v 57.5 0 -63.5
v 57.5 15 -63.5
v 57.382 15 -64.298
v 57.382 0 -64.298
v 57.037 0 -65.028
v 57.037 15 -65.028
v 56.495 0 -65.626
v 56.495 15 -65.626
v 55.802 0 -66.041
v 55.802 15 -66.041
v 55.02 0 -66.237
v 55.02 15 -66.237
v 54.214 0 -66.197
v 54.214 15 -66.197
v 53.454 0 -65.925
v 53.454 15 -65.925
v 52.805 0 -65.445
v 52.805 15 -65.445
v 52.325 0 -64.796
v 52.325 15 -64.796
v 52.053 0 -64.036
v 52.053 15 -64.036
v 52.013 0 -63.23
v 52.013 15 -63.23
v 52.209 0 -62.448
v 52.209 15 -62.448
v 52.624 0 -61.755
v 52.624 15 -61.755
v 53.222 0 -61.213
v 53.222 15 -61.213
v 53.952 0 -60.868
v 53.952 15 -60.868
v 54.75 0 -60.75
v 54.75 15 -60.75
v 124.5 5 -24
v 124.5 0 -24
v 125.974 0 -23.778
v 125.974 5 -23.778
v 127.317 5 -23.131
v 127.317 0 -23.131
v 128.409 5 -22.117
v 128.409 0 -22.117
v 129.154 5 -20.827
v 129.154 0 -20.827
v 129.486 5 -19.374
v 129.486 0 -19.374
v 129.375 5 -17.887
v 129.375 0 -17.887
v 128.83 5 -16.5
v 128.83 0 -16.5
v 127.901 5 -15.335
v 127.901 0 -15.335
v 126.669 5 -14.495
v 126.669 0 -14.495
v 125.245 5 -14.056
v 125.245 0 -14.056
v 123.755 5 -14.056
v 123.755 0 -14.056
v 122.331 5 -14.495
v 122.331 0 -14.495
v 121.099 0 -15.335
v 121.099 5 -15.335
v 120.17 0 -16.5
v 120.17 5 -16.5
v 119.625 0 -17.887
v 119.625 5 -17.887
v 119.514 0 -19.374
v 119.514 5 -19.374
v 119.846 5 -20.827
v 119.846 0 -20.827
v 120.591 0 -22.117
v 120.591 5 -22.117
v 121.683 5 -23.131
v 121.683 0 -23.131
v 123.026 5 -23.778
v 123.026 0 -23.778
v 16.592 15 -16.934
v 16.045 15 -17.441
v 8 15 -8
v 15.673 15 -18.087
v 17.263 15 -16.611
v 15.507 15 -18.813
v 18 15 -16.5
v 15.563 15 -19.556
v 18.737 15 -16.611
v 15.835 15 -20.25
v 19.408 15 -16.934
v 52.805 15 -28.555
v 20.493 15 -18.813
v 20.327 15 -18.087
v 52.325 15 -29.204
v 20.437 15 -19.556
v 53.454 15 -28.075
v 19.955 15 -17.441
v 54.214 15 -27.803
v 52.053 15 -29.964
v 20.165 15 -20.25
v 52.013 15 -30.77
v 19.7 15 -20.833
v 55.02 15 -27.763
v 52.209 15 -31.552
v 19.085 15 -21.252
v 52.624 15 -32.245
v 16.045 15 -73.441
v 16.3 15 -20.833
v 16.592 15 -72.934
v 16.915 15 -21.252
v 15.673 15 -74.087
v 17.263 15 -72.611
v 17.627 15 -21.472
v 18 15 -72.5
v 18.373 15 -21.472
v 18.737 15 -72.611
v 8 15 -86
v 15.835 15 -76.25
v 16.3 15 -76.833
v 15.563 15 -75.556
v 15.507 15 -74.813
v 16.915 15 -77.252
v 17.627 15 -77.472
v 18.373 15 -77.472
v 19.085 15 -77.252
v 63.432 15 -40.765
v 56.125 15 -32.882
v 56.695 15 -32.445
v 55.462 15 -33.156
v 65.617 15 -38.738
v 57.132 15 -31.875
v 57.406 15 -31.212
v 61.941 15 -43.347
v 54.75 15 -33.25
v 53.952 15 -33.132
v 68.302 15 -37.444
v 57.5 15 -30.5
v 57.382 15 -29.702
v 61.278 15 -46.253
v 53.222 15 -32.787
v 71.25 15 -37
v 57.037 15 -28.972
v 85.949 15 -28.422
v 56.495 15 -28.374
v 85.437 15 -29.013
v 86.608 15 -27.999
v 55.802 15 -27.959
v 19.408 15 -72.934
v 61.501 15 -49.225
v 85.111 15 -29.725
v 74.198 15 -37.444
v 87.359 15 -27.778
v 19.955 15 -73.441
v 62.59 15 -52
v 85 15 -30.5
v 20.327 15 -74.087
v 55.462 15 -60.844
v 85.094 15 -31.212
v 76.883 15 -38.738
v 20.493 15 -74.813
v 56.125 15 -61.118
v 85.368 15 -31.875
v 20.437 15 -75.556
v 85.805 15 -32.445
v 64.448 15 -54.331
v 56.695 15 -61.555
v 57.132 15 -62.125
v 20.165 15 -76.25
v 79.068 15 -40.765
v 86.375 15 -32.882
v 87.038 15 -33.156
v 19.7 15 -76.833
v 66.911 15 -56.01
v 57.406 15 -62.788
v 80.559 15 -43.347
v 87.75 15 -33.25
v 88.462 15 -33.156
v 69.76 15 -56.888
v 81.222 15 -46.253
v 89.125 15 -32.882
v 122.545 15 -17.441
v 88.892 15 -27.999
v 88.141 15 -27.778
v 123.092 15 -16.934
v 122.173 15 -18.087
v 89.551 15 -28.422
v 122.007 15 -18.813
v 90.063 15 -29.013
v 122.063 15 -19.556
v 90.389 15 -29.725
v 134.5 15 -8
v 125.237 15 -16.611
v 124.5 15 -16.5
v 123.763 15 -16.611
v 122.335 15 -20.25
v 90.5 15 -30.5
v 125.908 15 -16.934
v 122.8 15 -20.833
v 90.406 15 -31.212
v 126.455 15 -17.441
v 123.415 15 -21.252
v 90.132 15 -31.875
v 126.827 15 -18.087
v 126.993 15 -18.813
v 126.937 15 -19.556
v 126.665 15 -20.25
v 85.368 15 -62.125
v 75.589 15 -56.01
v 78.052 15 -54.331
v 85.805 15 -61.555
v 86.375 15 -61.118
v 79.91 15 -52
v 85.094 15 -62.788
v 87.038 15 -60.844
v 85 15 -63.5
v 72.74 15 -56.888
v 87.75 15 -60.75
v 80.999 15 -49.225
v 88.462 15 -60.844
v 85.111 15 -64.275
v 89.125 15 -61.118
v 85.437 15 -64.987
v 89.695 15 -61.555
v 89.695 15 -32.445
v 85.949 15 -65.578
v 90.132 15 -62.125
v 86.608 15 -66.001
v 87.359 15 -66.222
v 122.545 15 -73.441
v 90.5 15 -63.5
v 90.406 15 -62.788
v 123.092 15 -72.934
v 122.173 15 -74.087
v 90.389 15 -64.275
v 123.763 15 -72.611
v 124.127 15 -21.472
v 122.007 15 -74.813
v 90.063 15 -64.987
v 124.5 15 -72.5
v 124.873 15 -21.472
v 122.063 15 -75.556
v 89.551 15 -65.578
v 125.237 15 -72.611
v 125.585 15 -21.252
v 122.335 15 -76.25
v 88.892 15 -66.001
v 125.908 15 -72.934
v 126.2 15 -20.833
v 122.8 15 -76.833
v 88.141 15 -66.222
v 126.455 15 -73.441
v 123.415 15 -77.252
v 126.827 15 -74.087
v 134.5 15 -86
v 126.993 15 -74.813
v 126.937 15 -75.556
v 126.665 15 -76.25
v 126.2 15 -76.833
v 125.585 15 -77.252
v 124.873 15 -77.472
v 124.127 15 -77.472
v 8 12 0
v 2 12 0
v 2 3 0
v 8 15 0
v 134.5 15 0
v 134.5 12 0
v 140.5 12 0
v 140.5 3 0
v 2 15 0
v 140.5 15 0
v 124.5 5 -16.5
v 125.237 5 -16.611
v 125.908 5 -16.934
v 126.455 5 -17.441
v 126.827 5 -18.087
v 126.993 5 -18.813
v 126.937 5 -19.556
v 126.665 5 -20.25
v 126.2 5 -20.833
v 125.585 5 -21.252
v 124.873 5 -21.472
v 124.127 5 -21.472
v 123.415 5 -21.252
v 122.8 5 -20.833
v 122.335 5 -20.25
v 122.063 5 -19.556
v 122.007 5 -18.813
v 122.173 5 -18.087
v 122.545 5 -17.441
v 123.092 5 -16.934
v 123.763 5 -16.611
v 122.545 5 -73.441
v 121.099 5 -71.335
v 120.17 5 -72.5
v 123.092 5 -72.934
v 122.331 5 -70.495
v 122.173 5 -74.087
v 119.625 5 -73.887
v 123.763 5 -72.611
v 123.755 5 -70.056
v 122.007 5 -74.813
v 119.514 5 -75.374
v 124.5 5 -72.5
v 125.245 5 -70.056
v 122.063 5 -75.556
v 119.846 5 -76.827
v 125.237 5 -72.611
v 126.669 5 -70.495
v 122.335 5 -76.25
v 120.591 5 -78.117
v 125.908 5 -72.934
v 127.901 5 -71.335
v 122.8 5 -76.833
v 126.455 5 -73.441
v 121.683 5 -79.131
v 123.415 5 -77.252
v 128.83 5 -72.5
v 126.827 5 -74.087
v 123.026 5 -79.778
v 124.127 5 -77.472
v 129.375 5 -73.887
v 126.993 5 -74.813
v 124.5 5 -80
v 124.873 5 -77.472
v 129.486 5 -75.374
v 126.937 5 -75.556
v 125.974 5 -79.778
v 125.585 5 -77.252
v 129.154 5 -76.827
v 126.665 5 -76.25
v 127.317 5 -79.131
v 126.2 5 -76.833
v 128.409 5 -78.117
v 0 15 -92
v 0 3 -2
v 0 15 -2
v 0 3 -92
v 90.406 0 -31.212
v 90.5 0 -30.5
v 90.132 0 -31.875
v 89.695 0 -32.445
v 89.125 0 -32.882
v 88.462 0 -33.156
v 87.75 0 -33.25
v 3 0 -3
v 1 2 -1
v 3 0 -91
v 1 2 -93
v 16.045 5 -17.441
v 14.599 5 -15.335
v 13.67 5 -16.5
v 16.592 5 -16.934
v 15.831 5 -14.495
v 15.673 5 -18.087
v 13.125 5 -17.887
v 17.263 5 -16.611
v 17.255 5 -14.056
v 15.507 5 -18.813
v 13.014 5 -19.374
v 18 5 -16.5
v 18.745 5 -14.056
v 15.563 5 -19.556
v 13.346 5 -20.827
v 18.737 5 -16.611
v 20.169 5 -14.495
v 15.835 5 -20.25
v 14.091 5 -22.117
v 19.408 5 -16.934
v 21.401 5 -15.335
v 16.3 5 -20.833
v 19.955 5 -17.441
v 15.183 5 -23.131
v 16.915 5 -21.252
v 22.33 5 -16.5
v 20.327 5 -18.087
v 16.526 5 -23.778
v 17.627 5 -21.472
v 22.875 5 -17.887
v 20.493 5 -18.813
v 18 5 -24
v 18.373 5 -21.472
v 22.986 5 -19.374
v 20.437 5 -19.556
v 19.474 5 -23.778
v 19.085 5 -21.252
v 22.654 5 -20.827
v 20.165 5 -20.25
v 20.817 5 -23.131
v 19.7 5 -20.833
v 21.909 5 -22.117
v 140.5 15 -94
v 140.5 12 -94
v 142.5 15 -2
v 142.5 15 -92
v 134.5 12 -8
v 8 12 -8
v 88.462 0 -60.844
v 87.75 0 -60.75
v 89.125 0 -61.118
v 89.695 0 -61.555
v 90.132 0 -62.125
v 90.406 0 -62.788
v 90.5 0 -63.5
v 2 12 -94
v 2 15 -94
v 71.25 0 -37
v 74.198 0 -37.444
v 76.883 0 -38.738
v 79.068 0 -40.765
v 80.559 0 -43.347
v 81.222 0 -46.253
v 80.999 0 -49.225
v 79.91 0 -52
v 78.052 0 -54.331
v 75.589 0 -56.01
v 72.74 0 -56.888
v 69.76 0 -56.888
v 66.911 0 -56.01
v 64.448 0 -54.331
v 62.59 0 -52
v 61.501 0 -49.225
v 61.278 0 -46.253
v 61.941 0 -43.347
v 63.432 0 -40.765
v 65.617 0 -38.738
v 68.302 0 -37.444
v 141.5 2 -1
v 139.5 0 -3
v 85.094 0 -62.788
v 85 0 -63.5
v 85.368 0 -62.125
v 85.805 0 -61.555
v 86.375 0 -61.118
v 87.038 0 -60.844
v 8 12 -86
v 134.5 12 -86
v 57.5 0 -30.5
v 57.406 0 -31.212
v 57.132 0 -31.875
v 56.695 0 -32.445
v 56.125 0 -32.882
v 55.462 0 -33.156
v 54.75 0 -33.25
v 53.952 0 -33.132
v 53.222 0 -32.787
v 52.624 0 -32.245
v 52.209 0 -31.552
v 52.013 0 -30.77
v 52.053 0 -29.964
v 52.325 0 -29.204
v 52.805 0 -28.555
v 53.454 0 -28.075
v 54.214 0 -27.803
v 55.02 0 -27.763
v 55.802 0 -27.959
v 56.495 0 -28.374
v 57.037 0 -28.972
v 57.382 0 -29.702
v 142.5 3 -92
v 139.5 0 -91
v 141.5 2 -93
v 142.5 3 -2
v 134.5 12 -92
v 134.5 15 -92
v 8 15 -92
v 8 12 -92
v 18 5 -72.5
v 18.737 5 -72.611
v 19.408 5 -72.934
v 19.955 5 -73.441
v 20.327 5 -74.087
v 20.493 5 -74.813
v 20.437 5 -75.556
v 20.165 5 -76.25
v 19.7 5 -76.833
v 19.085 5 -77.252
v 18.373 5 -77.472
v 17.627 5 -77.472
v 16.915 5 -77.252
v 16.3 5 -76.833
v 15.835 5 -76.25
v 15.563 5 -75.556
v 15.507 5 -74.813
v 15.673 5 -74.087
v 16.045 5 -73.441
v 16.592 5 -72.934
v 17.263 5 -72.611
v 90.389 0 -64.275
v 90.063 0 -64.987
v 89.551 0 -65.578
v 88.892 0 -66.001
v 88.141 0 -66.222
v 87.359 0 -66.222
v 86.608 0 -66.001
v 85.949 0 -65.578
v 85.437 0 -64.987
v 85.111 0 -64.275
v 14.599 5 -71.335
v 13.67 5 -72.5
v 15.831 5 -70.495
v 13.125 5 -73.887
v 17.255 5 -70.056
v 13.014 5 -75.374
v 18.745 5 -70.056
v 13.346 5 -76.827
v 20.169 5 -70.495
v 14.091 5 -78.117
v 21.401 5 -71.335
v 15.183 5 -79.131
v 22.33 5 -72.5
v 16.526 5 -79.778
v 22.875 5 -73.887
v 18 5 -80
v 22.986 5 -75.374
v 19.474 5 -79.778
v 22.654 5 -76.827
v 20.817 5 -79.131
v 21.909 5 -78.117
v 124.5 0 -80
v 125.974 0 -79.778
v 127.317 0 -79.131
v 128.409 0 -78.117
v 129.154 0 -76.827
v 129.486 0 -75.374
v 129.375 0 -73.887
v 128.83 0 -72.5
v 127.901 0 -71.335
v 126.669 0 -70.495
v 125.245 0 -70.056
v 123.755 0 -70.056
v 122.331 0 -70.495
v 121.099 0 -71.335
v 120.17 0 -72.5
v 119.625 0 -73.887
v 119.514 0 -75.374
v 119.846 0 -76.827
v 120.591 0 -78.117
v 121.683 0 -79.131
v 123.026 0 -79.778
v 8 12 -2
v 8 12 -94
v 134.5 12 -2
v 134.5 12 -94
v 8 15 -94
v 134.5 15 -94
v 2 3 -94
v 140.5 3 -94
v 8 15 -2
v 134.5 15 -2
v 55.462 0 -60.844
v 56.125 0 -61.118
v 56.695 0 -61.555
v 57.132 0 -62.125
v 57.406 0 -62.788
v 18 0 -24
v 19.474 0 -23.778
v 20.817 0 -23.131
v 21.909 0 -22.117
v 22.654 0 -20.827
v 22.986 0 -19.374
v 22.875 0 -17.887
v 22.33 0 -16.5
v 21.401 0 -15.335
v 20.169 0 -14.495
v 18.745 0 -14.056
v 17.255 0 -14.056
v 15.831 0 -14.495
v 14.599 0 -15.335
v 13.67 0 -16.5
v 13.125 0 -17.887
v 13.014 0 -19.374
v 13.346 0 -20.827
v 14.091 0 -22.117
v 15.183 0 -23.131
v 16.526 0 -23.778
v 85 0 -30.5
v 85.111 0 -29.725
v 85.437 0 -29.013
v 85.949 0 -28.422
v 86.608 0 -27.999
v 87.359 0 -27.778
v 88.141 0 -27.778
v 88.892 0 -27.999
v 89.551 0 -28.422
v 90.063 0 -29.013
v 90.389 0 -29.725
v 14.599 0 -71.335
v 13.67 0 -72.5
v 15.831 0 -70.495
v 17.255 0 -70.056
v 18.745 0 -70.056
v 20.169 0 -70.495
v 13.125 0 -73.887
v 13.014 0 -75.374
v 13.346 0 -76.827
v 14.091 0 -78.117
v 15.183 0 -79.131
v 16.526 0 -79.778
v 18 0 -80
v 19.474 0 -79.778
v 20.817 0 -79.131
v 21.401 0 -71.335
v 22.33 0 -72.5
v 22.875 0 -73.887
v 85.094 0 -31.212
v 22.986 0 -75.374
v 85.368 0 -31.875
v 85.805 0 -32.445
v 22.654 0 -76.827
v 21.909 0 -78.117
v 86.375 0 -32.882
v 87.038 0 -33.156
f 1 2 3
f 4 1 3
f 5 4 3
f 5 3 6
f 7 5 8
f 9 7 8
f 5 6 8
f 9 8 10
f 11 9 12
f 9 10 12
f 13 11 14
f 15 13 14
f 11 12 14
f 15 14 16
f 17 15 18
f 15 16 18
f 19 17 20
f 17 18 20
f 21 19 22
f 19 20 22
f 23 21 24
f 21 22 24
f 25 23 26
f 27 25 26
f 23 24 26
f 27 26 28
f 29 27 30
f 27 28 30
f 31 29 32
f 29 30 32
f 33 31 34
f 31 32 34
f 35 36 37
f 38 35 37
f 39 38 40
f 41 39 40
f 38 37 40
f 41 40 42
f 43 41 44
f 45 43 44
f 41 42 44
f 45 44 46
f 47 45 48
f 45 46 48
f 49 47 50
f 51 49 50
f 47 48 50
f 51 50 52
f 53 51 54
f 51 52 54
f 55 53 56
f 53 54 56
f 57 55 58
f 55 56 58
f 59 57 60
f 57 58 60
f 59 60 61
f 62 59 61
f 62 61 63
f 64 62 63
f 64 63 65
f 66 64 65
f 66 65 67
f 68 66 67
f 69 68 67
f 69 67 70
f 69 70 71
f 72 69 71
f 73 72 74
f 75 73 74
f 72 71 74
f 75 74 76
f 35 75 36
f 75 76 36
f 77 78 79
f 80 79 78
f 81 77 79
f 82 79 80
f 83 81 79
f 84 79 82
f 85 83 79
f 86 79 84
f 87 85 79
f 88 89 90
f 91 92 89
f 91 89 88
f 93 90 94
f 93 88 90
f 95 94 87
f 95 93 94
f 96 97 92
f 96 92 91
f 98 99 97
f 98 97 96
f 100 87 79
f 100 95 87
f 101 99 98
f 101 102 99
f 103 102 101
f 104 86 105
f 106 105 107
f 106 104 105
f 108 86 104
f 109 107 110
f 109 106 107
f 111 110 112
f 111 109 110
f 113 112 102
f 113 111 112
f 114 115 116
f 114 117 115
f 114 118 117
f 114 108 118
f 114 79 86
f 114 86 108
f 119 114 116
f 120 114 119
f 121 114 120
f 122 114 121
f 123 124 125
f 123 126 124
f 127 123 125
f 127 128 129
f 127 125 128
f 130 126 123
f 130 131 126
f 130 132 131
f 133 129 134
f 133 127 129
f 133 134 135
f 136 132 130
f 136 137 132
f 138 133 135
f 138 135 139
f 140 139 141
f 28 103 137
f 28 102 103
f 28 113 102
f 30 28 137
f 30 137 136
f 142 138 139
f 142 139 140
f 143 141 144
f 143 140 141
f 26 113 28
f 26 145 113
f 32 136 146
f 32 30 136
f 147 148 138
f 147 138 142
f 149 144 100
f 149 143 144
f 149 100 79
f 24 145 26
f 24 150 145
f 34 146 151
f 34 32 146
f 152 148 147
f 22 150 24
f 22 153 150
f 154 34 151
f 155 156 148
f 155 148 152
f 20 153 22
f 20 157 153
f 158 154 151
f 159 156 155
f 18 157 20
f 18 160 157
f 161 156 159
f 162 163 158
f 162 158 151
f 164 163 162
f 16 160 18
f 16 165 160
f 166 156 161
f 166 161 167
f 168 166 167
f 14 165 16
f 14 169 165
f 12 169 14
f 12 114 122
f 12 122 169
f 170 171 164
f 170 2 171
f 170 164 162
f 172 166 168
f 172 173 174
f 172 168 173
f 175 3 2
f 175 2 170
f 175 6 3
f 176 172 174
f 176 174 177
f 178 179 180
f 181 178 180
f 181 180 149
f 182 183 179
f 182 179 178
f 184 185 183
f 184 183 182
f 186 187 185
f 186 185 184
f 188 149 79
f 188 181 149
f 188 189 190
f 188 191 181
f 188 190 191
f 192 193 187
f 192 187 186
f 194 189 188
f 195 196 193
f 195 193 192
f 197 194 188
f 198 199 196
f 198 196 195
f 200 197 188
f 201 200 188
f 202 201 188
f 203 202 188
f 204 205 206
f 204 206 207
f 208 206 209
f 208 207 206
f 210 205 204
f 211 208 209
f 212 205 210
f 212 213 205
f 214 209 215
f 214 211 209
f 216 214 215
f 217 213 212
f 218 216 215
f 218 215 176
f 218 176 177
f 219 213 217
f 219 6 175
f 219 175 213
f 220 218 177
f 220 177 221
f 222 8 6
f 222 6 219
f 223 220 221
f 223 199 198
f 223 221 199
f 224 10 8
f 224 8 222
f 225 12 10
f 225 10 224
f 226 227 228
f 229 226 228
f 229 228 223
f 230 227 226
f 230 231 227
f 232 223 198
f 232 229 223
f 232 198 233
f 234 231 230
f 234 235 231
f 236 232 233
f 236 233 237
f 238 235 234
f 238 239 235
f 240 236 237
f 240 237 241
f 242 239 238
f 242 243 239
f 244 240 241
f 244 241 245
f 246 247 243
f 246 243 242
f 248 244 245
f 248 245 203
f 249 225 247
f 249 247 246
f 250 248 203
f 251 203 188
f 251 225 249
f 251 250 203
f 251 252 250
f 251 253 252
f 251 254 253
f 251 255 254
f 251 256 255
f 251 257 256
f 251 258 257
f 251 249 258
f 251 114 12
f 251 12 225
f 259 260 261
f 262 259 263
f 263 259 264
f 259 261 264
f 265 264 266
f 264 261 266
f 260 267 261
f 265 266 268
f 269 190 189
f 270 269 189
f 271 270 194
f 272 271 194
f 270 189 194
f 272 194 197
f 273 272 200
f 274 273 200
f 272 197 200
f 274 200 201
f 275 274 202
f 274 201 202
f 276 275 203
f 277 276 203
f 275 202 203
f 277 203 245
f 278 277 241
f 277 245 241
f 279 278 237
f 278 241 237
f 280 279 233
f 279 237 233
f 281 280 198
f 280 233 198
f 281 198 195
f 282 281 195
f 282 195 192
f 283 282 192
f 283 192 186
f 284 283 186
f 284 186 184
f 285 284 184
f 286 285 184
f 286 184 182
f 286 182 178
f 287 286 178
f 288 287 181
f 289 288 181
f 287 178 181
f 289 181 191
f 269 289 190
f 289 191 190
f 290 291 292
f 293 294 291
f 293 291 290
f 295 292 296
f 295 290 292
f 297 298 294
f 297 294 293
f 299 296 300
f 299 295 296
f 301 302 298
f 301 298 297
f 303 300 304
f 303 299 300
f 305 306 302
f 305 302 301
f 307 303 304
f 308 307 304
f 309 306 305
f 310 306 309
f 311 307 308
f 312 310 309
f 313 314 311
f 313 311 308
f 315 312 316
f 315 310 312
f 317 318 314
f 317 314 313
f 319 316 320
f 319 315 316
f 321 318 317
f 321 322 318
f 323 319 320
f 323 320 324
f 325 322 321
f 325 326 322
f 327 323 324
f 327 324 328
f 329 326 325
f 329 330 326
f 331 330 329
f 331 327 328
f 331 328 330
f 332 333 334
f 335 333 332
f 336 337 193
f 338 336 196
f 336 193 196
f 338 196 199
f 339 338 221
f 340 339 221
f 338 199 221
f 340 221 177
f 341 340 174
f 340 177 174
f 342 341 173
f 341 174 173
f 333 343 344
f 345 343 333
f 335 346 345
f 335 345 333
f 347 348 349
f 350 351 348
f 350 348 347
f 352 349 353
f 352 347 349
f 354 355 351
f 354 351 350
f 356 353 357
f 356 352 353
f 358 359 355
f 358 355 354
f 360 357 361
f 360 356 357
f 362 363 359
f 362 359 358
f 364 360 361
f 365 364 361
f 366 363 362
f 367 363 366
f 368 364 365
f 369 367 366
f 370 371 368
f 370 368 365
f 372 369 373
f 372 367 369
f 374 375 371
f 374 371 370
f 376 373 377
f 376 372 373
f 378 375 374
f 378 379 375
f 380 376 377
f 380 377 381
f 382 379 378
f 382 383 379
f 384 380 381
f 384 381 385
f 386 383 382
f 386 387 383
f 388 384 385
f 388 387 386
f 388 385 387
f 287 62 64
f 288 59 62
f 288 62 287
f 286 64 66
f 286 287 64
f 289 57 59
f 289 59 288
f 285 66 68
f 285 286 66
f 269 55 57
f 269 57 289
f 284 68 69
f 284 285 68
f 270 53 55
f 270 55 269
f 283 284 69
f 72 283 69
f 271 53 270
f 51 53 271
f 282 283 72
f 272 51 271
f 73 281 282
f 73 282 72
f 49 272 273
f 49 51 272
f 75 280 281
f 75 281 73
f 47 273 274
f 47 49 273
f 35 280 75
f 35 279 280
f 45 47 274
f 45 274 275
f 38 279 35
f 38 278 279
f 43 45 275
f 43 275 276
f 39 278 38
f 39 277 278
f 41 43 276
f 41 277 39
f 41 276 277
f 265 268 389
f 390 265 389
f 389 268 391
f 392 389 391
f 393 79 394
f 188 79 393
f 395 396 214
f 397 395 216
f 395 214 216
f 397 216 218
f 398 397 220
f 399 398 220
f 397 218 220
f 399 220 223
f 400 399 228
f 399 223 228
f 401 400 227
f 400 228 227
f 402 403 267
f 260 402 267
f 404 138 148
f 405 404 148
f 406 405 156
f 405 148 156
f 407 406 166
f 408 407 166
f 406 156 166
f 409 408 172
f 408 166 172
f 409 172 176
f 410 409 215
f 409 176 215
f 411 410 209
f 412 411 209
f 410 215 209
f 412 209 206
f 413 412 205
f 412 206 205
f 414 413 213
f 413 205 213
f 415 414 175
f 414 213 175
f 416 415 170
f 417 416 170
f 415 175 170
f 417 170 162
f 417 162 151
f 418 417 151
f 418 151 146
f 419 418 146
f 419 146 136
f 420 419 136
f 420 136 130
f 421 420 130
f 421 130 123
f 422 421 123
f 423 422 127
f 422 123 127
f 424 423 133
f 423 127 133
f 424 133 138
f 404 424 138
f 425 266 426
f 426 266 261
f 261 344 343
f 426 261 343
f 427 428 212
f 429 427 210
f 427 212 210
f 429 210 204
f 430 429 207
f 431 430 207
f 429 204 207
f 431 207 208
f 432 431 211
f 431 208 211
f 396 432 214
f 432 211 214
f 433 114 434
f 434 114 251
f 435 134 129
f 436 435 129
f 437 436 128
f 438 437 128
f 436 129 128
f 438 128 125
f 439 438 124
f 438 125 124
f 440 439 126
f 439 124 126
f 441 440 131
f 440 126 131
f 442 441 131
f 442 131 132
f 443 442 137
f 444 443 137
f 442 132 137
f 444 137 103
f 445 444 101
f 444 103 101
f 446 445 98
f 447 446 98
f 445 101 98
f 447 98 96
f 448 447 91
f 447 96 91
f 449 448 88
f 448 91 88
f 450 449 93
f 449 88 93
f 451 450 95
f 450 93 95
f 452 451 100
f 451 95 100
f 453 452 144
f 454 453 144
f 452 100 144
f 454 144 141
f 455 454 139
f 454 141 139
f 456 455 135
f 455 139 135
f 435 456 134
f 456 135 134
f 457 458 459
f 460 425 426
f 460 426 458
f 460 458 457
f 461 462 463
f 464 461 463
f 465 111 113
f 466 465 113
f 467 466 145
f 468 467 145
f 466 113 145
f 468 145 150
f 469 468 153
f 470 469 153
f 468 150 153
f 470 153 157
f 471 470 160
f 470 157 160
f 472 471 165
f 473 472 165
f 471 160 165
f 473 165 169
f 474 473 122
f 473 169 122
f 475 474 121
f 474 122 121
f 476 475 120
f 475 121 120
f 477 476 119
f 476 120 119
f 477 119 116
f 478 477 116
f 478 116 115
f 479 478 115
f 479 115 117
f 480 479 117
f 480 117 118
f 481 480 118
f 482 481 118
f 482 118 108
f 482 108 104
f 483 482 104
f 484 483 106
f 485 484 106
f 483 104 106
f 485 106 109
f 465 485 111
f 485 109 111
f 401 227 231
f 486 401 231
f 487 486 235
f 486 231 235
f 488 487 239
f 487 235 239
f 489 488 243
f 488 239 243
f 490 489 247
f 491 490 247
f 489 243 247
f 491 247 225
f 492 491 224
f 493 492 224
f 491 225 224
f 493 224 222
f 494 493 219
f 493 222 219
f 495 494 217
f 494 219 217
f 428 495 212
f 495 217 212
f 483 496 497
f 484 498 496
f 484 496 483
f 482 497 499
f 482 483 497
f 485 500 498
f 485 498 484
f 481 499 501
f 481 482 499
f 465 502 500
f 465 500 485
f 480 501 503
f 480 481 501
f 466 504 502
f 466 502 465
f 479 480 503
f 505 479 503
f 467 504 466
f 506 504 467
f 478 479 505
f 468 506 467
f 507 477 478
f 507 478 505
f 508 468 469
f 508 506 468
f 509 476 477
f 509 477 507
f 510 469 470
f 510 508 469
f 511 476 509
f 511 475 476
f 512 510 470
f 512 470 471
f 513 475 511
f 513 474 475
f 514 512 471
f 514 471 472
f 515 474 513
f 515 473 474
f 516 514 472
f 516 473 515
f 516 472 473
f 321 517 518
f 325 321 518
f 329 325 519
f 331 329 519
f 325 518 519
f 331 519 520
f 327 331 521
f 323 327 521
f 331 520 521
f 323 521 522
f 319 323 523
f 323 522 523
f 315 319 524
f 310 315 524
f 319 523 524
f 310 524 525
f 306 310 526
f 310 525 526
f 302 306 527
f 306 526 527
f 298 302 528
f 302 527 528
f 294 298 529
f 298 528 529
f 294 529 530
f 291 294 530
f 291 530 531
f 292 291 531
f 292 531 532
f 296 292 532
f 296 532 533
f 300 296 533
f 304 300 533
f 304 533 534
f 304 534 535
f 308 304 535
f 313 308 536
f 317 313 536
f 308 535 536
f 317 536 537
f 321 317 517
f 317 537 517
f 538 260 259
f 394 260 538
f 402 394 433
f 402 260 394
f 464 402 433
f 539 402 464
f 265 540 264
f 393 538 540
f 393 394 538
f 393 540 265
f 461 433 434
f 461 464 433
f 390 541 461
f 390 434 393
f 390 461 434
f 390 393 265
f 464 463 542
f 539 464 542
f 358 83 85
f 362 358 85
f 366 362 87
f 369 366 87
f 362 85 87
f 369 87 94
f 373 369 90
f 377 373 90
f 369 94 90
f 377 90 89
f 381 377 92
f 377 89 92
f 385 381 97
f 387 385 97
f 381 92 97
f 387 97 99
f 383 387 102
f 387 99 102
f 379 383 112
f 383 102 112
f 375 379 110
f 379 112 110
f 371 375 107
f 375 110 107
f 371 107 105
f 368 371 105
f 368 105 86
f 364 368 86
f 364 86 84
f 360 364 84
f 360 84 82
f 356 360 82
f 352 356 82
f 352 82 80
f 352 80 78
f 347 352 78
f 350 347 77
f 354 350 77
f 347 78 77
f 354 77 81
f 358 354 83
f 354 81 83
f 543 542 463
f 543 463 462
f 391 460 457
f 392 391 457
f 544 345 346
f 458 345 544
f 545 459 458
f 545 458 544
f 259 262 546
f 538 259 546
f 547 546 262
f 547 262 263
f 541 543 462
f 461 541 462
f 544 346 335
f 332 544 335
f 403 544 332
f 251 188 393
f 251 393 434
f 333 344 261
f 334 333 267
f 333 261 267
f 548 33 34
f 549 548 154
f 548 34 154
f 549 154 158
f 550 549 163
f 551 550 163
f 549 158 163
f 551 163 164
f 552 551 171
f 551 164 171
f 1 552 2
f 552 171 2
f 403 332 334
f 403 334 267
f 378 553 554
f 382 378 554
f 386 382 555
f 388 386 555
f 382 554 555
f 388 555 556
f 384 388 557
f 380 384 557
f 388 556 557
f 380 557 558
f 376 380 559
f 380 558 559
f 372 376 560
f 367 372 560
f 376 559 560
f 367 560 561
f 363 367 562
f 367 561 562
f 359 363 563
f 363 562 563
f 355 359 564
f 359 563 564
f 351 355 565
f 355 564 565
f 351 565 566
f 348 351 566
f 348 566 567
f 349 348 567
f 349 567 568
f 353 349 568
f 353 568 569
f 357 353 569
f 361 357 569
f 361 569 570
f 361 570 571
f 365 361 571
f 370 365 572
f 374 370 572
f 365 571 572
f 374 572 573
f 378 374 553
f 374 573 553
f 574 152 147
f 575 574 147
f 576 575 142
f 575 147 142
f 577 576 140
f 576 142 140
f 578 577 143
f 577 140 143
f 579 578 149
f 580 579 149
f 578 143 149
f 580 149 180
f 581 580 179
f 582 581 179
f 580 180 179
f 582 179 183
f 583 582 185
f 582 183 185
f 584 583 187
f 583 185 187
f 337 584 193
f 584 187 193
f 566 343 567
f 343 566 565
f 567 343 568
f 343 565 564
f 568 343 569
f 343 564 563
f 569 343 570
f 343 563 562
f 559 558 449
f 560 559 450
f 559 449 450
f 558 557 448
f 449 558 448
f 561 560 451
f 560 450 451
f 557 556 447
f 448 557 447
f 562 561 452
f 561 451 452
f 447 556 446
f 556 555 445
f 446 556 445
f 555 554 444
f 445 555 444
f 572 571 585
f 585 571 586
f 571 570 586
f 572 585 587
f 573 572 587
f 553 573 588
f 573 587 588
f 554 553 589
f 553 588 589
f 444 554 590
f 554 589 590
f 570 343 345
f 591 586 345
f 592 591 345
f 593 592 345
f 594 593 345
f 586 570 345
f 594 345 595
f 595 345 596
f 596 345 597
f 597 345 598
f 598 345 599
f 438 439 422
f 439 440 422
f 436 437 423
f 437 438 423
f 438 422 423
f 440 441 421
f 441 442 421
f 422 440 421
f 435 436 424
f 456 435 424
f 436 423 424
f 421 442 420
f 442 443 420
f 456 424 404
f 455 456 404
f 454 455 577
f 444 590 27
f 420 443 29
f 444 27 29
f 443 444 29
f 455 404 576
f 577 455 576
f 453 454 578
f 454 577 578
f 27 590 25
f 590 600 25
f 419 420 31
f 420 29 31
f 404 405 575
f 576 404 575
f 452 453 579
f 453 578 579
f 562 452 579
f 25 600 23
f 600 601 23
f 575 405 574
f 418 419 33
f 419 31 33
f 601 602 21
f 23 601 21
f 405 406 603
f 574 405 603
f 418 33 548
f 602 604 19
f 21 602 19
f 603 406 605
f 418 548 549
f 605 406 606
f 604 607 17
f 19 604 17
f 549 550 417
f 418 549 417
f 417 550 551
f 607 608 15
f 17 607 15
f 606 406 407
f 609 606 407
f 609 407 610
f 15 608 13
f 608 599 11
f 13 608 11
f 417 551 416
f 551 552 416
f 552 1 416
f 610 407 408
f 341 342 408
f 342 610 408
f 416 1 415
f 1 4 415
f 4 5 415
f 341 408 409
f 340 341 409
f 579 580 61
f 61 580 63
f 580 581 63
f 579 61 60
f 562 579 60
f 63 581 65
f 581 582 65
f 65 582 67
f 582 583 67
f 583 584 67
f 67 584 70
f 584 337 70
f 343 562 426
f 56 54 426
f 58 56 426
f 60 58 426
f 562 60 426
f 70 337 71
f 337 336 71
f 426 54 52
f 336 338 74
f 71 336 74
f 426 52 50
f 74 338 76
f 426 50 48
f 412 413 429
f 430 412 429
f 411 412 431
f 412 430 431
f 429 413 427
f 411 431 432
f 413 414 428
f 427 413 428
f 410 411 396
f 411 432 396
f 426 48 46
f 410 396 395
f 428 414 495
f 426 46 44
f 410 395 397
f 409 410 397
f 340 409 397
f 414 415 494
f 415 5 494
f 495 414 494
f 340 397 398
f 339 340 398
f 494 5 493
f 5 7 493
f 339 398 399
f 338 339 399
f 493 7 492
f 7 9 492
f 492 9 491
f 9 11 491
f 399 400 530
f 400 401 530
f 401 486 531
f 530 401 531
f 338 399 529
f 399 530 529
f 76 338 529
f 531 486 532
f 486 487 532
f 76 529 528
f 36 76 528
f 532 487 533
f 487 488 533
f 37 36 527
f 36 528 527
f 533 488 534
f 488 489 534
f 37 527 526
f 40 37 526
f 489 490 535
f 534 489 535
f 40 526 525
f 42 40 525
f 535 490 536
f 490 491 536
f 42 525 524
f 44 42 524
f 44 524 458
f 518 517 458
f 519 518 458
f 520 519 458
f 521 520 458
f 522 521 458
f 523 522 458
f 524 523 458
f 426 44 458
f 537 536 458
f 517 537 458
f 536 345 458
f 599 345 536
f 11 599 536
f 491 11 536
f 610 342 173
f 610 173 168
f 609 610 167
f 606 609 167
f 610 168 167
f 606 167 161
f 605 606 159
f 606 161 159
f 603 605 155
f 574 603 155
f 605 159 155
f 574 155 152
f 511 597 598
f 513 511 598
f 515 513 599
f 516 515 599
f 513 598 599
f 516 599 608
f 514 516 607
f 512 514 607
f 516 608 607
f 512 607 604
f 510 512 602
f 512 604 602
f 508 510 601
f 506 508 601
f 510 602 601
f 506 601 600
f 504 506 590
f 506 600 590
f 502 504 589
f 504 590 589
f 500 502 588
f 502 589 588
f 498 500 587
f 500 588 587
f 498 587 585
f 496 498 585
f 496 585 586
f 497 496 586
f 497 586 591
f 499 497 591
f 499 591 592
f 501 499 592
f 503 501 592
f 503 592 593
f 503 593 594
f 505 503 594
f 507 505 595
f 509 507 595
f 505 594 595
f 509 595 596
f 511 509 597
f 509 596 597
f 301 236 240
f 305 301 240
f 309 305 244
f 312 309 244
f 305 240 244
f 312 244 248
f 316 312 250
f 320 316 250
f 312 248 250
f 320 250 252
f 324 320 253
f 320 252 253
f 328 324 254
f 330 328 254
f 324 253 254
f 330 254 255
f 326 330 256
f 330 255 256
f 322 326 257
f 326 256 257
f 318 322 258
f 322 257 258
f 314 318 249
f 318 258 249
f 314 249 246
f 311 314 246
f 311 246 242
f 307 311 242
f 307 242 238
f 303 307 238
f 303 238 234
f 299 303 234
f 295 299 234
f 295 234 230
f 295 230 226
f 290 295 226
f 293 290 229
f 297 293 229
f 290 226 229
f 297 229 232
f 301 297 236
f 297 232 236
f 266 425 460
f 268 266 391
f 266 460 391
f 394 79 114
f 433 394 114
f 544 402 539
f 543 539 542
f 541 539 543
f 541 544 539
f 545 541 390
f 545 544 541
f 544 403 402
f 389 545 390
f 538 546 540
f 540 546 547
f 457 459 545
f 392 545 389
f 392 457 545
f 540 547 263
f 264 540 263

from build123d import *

# Parameters (mm, degrees)
SKETCH1_W           = 142.5
SKETCH1_H           = 94
BOSS_EXTRUDE1_DEPTH = 15
SKETCH2_W           = 126.5
SKETCH2_H           = 78
CUT_EXTRUDE2_DEPTH  = 3
CHAMFER1_SIZE       = 2
SKETCH6_R           = 2.5
CUT_EXTRUDE7_DEPTH  = 10
SKETCH7_R           = 5
CUT_EXTRUDE8_DEPTH  = 5
CHAMFER2_SIZE       = 3
SKETCH8_R           = 10
CUT_EXTRUDE9_DEPTH  = 15
CUT_EXTRUDE10_DEPTH = 172.368754445


# Some blends are built 0.0001 mm under size
with BuildPart() as part:
    # Sketch1 → Boss-Extrude1 (new body)
    with BuildSketch(Plane(origin=(0, 0, 0), x_dir=(1, 0, 0), z_dir=(0, 1, 0))):
        with Locations((71.25, 47)):
            Rectangle(SKETCH1_W, SKETCH1_H)
    extrude(amount=BOSS_EXTRUDE1_DEPTH)

    # Sketch2 → Cut-Extrude2 (cut)
    with BuildSketch(Plane(origin=(0, 15, 0), x_dir=(1, 0, 0), z_dir=(0, 1, 0))):
        Polygon((134.5, 92), (8, 92), (8, 94), (2, 94), (2, 0), (8, 0), (8, 2), (134.5, 2), (134.5, 0), (140.5, 0), (140.5, 94), (134.5, 94), align=None)
        with Locations((71.25, 47)):
            Rectangle(SKETCH2_W, SKETCH2_H, mode=Mode.SUBTRACT)
    extrude(amount=-CUT_EXTRUDE2_DEPTH, mode=Mode.SUBTRACT)

    # Chamfer1
    chamfer1_edges = [part.edges().sort_by_distance(p)[0] for p in [
        (0, 7.5, 0),
        (0, 7.5, -94),
        (142.5, 7.5, -94),
        (142.5, 7.5, 0),
    ]]
    chamfer(chamfer1_edges, length=CHAMFER1_SIZE - 0.0001)  # a hair under: the kernel refuses the full size

    # Sketch6 → Cut-Extrude7 (cut)
    with BuildSketch(Plane(origin=(0, 15, 0), x_dir=(1, 0, 0), z_dir=(0, 1, 0))):
        with Locations(Location((124.5, 75, 0), (0, 0, 270))):
            Circle(SKETCH6_R)
        with Locations(Location((18, 75, 0), (0, 0, 270))):
            Circle(SKETCH6_R)
        with Locations(Location((18, 19, 0), (0, 0, 270))):
            Circle(SKETCH6_R)
        with Locations(Location((124.5, 19, 0), (0, 0, 270))):
            Circle(SKETCH6_R)
    extrude(amount=-CUT_EXTRUDE7_DEPTH, mode=Mode.SUBTRACT)

    # Sketch7 → Cut-Extrude8 (cut)
    with BuildSketch(Plane.XZ):
        with Locations(Location((18, -19, 0), (0, 0, 270))):
            Circle(SKETCH7_R)
        with Locations(Location((124.5, -19, 0), (0, 0, 270))):
            Circle(SKETCH7_R)
        with Locations(Location((18, -75, 0), (0, 0, 270))):
            Circle(SKETCH7_R)
        with Locations(Location((124.5, -75, 0), (0, 0, 270))):
            Circle(SKETCH7_R)
    extrude(amount=-CUT_EXTRUDE8_DEPTH, mode=Mode.SUBTRACT)

    # Chamfer2
    # the kernel refuses this chamfer: 3 mm, written as the material it takes off along each edge
    with BuildSketch(Plane(origin=(142.5, 0, 5.715148964), x_dir=(-0.9996219169112968, -0.027495876610586487, 0), z_dir=(0, 0, -1)), Plane(origin=(0, 0, -99.715148964), x_dir=(0.9996219169112968, -0.027495876610586372, 0), z_dir=(0, 0, 1))) as chamfer2_piece_1:
        Polygon((CHAMFER2_SIZE * 0.999621916911, CHAMFER2_SIZE * 0.0274958766106), (-CHAMFER2_SIZE * 0.0274958766106, CHAMFER2_SIZE * 0.999621916911), (0, 0), align=None)
    extrude(amount=105.430297928, mode=Mode.SUBTRACT)
    with BuildSketch(Plane(origin=(-5.715148964, 0, 0), x_dir=(0, 0.9996219169112968, 0.027495876610586372), z_dir=(1, 0, 0))) as chamfer2_piece_2:
        Polygon((CHAMFER2_SIZE * 0.999621916911, -CHAMFER2_SIZE * 0.0274958766106), (-CHAMFER2_SIZE * 0.0274958766106, -CHAMFER2_SIZE * 0.999621916911), (0, 0), align=None)
    extrude(amount=153.930297928, mode=Mode.SUBTRACT)
    with BuildSketch(Plane(origin=(148.215148964, 0, -94), x_dir=(0, -0.02749587661058636, 0.9996219169112968), z_dir=(-1, 0, 0))) as chamfer2_piece_3:
        Polygon((CHAMFER2_SIZE * 0.999621916911, CHAMFER2_SIZE * 0.0274958766106), (-CHAMFER2_SIZE * 0.0274958766106, CHAMFER2_SIZE * 0.999621916911), (0, 0), align=None)
    extrude(amount=153.930297928, mode=Mode.SUBTRACT)

    # Sketch8 → Cut-Extrude9 (cut)
    with BuildSketch(Plane(origin=(0, 15, 0), x_dir=(1, 0, 0), z_dir=(0, 1, 0))):
        with Locations(Location((71.25, 47, 0), (0, 0, 270))):
            Circle(SKETCH8_R)
    extrude(amount=-CUT_EXTRUDE9_DEPTH, mode=Mode.SUBTRACT)

    # Sketch9 → Cut-Extrude10 (cut, through all)
    with BuildSketch(Plane(origin=(0, 15, 0), x_dir=(1, 0, 0), z_dir=(0, 1, 0))):
        with BuildLine():
            Line((54.75, 60.75), (54.75, 63.5))
            Line((54.75, 63.5), (57.5, 63.5))
            ThreePointArc((57.5, 63.5), (52.805456352, 65.444543648), (54.75, 60.75))
        make_face()
        with BuildLine():
            Line((57.5, 63.5), (54.75, 63.5))
            Line((54.75, 63.5), (54.75, 60.75))
            ThreePointArc((54.75, 60.75), (56.694543648, 61.555456352), (57.5, 63.5))
        make_face()
        with BuildLine():
            ThreePointArc((57.5, 30.5), (56.694543648, 32.444543648), (54.75, 33.25))
            Line((54.75, 33.25), (54.75, 30.5))
            Line((54.75, 30.5), (57.5, 30.5))
        make_face()
        with BuildLine():
            Line((54.75, 30.5), (54.75, 33.25))
            ThreePointArc((54.75, 33.25), (52.805456352, 28.555456352), (57.5, 30.5))
            Line((57.5, 30.5), (54.75, 30.5))
        make_face()
        with BuildLine():
            ThreePointArc((90.5, 30.5), (89.694543648, 32.444543648), (87.75, 33.25))
            Line((87.75, 33.25), (87.75, 30.5))
            Line((87.75, 30.5), (85, 30.5))
            ThreePointArc((85, 30.5), (87.75, 27.75), (90.5, 30.5))
        make_face()
        with BuildLine():
            Line((87.75, 30.5), (87.75, 33.25))
            ThreePointArc((87.75, 33.25), (85.805456352, 32.444543648), (85, 30.5))
            Line((85, 30.5), (87.75, 30.5))
        make_face()
        with BuildLine():
            ThreePointArc((90.5, 63.5), (87.75, 66.25), (85, 63.5))
            Line((85, 63.5), (87.75, 63.5))
            Line((87.75, 63.5), (87.75, 60.75))
            ThreePointArc((87.75, 60.75), (89.694543648, 61.555456352), (90.5, 63.5))
        make_face()
        with BuildLine():
            Line((87.75, 63.5), (85, 63.5))
            ThreePointArc((85, 63.5), (85.805456352, 61.555456352), (87.75, 60.75))
            Line((87.75, 60.75), (87.75, 63.5))
        make_face()
    extrude(amount=-CUT_EXTRUDE10_DEPTH, mode=Mode.SUBTRACT)


solid = part.part
